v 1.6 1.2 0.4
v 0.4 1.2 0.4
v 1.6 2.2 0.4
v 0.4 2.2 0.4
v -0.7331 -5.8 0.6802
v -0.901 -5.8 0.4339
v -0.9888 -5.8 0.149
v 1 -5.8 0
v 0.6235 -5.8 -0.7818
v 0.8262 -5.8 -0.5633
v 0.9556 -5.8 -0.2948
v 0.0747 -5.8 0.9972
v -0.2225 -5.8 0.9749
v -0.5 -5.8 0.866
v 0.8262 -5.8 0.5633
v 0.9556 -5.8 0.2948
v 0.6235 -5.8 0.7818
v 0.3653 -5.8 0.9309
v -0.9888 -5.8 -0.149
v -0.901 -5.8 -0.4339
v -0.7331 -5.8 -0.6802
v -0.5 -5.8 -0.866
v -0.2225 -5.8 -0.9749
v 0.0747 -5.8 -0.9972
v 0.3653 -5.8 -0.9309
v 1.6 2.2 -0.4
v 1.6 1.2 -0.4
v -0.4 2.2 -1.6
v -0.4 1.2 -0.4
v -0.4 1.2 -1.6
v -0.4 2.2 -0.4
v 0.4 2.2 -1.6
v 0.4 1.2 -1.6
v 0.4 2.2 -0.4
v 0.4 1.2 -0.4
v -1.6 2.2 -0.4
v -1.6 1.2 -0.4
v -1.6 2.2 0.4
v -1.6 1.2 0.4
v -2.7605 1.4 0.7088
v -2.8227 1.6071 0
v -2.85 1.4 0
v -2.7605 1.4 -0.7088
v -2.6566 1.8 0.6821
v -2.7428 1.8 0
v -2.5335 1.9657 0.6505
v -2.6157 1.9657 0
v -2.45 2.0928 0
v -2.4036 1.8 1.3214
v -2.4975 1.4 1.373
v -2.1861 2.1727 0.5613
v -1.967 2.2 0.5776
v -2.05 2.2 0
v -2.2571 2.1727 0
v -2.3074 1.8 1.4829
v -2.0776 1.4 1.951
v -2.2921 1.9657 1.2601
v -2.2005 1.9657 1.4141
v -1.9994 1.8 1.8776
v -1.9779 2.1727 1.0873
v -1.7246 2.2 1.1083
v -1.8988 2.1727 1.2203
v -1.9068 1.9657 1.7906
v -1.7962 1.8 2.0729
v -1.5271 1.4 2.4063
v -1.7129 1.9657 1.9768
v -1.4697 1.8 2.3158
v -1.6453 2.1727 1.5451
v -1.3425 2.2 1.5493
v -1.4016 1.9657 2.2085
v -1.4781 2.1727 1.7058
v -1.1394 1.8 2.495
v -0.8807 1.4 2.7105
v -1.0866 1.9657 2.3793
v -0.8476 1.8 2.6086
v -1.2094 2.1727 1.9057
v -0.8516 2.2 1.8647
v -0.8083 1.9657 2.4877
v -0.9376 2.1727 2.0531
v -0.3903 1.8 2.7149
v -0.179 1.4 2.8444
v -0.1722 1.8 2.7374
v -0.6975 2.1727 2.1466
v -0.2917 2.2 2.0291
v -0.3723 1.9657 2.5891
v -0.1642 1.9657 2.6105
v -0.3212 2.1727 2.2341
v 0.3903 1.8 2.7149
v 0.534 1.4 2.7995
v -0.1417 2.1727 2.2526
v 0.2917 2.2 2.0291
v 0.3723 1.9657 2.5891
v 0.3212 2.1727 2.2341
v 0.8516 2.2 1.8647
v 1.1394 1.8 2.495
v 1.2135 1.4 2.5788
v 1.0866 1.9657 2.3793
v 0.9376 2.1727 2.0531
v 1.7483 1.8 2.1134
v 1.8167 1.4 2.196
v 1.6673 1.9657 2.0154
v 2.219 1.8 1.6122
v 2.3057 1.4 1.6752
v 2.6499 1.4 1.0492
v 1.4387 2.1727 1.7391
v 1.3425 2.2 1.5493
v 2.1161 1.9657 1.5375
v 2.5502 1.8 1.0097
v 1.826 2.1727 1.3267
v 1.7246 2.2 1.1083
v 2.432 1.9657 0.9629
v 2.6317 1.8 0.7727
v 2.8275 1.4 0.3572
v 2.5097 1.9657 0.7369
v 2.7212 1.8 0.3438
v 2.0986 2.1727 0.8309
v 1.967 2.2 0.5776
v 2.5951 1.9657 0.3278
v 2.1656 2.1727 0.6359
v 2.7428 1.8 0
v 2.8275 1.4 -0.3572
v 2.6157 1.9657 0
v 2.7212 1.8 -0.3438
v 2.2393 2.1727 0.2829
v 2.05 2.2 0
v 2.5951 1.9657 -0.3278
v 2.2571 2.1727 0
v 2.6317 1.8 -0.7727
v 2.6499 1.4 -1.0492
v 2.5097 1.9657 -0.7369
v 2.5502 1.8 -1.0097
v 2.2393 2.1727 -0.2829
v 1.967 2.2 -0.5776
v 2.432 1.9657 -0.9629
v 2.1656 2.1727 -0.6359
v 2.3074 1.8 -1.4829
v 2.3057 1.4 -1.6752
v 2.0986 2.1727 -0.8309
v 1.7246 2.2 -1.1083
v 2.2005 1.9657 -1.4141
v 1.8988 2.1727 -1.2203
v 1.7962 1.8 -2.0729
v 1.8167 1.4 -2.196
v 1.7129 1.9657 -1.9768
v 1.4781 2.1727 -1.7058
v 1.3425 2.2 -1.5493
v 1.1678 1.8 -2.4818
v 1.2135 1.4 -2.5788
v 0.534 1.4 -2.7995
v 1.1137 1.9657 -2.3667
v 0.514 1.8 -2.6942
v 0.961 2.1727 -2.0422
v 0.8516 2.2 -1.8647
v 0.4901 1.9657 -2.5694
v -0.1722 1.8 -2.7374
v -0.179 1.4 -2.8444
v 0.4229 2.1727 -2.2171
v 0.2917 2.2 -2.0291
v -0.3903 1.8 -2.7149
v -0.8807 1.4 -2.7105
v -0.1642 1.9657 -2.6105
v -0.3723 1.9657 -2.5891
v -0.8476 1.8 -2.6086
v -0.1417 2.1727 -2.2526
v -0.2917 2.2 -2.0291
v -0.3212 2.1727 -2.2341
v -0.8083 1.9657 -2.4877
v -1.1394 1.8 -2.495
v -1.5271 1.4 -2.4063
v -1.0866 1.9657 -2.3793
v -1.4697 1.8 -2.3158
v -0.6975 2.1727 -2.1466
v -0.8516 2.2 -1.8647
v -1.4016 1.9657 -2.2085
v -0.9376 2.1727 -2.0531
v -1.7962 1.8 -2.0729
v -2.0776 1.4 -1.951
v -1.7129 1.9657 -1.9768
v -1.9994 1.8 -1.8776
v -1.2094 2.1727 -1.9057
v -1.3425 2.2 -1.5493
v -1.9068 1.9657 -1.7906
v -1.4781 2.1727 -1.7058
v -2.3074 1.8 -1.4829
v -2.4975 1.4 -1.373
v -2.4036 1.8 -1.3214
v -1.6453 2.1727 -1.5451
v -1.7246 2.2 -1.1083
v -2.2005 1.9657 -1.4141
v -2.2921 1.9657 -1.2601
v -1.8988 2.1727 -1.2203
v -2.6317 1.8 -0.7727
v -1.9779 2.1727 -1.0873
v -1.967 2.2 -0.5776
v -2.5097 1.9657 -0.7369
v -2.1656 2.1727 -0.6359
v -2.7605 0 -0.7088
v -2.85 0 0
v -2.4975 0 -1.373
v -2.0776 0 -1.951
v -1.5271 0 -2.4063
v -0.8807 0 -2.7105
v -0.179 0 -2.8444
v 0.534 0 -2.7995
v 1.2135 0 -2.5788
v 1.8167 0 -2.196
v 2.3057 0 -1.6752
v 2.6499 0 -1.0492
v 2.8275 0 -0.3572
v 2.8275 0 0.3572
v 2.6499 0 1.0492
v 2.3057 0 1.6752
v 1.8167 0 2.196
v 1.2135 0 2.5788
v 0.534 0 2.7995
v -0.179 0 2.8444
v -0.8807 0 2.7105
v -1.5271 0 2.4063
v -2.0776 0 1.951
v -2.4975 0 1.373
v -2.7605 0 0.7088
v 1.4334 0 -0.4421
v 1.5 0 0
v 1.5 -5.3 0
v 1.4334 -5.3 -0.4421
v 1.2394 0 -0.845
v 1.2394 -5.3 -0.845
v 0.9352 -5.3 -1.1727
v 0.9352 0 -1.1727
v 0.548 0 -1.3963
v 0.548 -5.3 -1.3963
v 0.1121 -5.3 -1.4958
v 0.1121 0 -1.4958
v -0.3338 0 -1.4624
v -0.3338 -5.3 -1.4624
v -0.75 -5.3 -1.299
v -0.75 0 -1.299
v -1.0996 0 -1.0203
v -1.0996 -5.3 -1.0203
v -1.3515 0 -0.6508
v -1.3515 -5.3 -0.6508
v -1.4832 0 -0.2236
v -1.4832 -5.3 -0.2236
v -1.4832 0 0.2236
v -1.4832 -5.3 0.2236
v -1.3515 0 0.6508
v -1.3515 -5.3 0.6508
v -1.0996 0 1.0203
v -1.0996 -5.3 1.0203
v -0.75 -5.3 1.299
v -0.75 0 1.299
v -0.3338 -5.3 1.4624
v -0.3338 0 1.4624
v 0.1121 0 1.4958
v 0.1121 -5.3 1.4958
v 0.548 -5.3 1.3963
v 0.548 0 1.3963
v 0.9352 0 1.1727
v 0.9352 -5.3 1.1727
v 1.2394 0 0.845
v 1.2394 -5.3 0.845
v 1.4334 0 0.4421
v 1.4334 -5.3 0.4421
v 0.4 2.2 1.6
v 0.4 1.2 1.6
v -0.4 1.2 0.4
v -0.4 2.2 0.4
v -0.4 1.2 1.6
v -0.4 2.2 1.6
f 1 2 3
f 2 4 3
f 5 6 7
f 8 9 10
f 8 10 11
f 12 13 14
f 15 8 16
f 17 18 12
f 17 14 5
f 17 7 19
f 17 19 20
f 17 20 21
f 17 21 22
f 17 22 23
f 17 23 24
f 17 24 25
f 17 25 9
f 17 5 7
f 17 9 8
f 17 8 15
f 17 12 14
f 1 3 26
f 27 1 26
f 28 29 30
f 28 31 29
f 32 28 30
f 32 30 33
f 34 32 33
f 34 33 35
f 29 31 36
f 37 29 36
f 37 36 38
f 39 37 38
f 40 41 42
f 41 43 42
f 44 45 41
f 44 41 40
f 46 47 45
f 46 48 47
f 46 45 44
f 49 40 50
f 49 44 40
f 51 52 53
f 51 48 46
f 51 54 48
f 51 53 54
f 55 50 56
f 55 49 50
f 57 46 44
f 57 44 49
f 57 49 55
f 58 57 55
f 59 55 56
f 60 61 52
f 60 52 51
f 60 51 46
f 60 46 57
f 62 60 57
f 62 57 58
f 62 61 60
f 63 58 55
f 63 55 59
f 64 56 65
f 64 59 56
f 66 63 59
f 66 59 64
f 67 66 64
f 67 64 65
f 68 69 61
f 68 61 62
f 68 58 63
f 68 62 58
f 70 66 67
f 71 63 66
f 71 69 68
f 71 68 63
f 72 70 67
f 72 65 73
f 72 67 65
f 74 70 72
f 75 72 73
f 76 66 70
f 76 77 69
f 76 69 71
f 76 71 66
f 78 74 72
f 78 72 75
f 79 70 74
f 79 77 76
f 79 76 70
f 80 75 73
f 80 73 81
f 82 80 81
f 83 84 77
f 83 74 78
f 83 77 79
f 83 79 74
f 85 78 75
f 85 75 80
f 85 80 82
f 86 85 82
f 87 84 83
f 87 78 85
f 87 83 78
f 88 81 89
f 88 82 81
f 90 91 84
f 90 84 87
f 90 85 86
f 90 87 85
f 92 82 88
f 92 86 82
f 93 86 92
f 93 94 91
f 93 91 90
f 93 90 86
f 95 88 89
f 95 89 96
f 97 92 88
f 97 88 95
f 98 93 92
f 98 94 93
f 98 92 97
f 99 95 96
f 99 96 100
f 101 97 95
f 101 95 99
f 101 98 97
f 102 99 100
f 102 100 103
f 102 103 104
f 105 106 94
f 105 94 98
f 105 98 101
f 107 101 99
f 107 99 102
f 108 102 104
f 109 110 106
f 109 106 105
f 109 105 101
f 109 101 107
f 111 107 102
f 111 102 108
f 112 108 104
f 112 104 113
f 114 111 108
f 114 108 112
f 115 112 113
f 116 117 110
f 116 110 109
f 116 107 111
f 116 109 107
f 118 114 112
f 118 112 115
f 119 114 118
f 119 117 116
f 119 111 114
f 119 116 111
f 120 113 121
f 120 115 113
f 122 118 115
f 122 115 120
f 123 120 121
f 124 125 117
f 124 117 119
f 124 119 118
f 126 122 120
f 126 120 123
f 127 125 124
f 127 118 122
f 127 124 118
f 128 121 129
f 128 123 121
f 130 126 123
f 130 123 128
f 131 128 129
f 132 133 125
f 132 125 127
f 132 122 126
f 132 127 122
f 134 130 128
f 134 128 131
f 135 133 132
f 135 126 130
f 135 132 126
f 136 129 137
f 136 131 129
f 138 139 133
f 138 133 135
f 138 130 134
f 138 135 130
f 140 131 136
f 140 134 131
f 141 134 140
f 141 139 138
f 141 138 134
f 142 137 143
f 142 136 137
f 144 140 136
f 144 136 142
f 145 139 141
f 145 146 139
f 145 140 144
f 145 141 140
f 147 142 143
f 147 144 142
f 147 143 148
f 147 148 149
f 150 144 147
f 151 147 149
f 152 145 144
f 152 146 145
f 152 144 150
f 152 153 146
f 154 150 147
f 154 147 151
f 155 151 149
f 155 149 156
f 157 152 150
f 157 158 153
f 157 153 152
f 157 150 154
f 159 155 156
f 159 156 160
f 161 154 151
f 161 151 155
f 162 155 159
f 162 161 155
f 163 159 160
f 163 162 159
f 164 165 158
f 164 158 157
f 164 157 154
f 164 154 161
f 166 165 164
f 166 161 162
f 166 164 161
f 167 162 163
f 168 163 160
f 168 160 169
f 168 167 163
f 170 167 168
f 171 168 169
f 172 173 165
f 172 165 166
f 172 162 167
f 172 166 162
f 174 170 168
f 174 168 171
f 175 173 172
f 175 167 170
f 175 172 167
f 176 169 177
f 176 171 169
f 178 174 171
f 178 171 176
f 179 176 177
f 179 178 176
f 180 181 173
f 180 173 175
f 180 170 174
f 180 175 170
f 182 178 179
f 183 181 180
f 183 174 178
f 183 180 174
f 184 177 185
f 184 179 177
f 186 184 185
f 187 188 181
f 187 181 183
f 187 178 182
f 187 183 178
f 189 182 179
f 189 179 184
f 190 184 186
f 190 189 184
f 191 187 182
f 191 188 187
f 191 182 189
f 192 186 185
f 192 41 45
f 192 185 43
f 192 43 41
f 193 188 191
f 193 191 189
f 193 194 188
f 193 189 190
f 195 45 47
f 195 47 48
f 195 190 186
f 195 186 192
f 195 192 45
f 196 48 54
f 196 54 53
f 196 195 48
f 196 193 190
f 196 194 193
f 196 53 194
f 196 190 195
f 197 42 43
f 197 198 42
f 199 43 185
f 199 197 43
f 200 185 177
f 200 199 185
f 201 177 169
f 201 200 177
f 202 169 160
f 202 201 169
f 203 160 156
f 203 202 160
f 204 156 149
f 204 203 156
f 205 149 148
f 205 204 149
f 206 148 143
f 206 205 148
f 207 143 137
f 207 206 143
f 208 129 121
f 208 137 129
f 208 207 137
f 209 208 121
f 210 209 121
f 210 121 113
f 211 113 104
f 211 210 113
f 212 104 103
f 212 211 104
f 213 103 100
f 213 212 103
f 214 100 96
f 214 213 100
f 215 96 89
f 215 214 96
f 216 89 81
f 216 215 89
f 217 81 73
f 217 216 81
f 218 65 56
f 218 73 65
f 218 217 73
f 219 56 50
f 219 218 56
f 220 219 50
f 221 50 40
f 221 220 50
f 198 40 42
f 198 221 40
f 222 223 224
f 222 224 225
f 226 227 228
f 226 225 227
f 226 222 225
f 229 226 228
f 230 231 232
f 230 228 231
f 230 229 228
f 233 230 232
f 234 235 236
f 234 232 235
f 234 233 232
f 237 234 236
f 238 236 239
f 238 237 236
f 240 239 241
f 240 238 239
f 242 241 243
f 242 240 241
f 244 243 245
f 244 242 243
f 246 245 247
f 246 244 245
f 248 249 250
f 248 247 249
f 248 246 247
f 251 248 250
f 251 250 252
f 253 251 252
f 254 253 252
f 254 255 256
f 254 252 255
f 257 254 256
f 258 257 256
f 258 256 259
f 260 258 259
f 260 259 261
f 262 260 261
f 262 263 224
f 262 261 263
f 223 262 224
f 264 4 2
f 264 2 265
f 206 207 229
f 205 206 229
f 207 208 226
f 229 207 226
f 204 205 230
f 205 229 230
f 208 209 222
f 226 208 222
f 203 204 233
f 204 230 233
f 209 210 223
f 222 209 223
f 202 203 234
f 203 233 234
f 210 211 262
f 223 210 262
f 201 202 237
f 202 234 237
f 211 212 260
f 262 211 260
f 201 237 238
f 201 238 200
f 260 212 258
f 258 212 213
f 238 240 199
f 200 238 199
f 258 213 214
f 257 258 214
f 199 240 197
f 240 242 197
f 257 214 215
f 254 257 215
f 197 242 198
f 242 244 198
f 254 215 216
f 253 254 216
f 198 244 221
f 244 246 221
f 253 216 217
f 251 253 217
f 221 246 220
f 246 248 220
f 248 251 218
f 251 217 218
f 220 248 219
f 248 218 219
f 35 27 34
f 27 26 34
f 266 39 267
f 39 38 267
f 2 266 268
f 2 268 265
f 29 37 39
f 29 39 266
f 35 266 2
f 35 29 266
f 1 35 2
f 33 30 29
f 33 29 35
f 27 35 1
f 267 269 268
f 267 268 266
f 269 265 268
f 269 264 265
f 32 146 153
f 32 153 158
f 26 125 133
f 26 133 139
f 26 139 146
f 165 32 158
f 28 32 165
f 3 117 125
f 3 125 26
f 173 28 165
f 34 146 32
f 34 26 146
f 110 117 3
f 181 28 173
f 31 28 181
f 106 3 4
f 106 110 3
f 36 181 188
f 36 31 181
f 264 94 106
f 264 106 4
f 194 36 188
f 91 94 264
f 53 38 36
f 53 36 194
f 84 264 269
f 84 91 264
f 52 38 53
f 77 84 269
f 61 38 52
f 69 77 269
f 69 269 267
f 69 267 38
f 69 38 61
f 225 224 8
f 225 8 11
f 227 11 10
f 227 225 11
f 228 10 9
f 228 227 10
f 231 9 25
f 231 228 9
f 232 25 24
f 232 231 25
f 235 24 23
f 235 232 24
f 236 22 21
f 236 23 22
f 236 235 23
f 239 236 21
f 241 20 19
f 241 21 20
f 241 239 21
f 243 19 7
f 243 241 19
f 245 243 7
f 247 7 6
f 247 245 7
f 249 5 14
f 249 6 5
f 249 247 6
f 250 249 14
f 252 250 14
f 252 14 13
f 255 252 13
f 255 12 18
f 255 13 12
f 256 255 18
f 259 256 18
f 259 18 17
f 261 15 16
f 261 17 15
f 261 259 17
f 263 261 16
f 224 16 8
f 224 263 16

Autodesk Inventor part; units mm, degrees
ref_plane "YZ Plane" through (0, 0, 0) normal (1, 0, 0) x (0, 1, 0)
ref_plane "XZ Plane" through (0, 0, 0) normal (0, 1, 0) x (-1, 0, 0)
ref_plane "XY Plane" through (0, 0, 0) normal (0, 0, 1) x (1, 0, 0)
sketch "Sketch1" plane through (0, 0, 0) normal (0, 1, 0) x (-1, 0, 0)
  circle A0 centre (0, 0) radius 2.85
  dimension "d0" = 5.7
extrude "Extrusion1" add sketch "Sketch1" along normal blind 2.2
sketch "Sketch2" plane through (0, 0, 0) normal (0, -1, 0) x (1, 0, 0)
  circle A0 centre (0, 0) radius 1.5
  dimension "d3" = 3
extrude "Extrusion2" add sketch "Sketch2" along normal blind 5.8
fillet "Fillet1" radius 0.8 1 edges at (2.85, 2.2, 0)
sketch "Sketch3" plane through (0, 2.2, 0) normal (0, 1, 0) x (1, 0, 0)
  line L0 (0.4, -1.6) -> (-0.4, -1.6)
  line L1 (-0.4, -1.6) -> (-0.4, 1.6)
  line L2 (-0.4, 1.6) -> (0.4, 1.6)
  line L3 (0.4, 1.6) -> (0.4, -1.6)
  line L4 (0.4, -1.6) -> (-0.4, 1.6) construction
  line L5 (-0.4, -1.6) -> (0.4, 1.6) construction
  line L6 (1.6, 0.4) -> (-1.6, 0.4)
  line L7 (-1.6, 0.4) -> (-1.6, -0.4)
  line L8 (-1.6, -0.4) -> (1.6, -0.4)
  line L9 (1.6, -0.4) -> (1.6, 0.4)
  circle A0 centre (0, 0) radius 1.5 projected
  line L10 (1.6, 0.4) -> (-1.6, -0.4) construction
  line L11 (-1.6, 0.4) -> (1.6, -0.4) construction
  point P0 (0.4, 0.4)
  point P1 (-0.4, 0.4)
  point P2 (-0.4, -0.4)
  point P3 (0.4, -0.4)
  dimension "d7" = 0.8
  dimension "d8" = 0.8
  dimension "d9" = 3.2
  dimension "d10" = 3.2
extrude "Extrusion3" cut sketch "Sketch3" against normal blind 1 contours L0 L1 A0 L3 | A0 L1 L8 L3 | L8 L1 L6 L3 | L3 L6 A0 L8 | A0 L6 L9 L8 | L8 A0 L6 L1 | L8 L7 L6 A0 | L6 L1 A0 L3 | A0 L1 L2 L3
chamfer "Chamfer1" distance 0.5 angle 45 1 edges at (-1.5, -5.8, 0)
thread "Thread1" size "M3x0.5" class "6g" standard "ANSI Metric M Profile" full length
properties part number "support_screw"
